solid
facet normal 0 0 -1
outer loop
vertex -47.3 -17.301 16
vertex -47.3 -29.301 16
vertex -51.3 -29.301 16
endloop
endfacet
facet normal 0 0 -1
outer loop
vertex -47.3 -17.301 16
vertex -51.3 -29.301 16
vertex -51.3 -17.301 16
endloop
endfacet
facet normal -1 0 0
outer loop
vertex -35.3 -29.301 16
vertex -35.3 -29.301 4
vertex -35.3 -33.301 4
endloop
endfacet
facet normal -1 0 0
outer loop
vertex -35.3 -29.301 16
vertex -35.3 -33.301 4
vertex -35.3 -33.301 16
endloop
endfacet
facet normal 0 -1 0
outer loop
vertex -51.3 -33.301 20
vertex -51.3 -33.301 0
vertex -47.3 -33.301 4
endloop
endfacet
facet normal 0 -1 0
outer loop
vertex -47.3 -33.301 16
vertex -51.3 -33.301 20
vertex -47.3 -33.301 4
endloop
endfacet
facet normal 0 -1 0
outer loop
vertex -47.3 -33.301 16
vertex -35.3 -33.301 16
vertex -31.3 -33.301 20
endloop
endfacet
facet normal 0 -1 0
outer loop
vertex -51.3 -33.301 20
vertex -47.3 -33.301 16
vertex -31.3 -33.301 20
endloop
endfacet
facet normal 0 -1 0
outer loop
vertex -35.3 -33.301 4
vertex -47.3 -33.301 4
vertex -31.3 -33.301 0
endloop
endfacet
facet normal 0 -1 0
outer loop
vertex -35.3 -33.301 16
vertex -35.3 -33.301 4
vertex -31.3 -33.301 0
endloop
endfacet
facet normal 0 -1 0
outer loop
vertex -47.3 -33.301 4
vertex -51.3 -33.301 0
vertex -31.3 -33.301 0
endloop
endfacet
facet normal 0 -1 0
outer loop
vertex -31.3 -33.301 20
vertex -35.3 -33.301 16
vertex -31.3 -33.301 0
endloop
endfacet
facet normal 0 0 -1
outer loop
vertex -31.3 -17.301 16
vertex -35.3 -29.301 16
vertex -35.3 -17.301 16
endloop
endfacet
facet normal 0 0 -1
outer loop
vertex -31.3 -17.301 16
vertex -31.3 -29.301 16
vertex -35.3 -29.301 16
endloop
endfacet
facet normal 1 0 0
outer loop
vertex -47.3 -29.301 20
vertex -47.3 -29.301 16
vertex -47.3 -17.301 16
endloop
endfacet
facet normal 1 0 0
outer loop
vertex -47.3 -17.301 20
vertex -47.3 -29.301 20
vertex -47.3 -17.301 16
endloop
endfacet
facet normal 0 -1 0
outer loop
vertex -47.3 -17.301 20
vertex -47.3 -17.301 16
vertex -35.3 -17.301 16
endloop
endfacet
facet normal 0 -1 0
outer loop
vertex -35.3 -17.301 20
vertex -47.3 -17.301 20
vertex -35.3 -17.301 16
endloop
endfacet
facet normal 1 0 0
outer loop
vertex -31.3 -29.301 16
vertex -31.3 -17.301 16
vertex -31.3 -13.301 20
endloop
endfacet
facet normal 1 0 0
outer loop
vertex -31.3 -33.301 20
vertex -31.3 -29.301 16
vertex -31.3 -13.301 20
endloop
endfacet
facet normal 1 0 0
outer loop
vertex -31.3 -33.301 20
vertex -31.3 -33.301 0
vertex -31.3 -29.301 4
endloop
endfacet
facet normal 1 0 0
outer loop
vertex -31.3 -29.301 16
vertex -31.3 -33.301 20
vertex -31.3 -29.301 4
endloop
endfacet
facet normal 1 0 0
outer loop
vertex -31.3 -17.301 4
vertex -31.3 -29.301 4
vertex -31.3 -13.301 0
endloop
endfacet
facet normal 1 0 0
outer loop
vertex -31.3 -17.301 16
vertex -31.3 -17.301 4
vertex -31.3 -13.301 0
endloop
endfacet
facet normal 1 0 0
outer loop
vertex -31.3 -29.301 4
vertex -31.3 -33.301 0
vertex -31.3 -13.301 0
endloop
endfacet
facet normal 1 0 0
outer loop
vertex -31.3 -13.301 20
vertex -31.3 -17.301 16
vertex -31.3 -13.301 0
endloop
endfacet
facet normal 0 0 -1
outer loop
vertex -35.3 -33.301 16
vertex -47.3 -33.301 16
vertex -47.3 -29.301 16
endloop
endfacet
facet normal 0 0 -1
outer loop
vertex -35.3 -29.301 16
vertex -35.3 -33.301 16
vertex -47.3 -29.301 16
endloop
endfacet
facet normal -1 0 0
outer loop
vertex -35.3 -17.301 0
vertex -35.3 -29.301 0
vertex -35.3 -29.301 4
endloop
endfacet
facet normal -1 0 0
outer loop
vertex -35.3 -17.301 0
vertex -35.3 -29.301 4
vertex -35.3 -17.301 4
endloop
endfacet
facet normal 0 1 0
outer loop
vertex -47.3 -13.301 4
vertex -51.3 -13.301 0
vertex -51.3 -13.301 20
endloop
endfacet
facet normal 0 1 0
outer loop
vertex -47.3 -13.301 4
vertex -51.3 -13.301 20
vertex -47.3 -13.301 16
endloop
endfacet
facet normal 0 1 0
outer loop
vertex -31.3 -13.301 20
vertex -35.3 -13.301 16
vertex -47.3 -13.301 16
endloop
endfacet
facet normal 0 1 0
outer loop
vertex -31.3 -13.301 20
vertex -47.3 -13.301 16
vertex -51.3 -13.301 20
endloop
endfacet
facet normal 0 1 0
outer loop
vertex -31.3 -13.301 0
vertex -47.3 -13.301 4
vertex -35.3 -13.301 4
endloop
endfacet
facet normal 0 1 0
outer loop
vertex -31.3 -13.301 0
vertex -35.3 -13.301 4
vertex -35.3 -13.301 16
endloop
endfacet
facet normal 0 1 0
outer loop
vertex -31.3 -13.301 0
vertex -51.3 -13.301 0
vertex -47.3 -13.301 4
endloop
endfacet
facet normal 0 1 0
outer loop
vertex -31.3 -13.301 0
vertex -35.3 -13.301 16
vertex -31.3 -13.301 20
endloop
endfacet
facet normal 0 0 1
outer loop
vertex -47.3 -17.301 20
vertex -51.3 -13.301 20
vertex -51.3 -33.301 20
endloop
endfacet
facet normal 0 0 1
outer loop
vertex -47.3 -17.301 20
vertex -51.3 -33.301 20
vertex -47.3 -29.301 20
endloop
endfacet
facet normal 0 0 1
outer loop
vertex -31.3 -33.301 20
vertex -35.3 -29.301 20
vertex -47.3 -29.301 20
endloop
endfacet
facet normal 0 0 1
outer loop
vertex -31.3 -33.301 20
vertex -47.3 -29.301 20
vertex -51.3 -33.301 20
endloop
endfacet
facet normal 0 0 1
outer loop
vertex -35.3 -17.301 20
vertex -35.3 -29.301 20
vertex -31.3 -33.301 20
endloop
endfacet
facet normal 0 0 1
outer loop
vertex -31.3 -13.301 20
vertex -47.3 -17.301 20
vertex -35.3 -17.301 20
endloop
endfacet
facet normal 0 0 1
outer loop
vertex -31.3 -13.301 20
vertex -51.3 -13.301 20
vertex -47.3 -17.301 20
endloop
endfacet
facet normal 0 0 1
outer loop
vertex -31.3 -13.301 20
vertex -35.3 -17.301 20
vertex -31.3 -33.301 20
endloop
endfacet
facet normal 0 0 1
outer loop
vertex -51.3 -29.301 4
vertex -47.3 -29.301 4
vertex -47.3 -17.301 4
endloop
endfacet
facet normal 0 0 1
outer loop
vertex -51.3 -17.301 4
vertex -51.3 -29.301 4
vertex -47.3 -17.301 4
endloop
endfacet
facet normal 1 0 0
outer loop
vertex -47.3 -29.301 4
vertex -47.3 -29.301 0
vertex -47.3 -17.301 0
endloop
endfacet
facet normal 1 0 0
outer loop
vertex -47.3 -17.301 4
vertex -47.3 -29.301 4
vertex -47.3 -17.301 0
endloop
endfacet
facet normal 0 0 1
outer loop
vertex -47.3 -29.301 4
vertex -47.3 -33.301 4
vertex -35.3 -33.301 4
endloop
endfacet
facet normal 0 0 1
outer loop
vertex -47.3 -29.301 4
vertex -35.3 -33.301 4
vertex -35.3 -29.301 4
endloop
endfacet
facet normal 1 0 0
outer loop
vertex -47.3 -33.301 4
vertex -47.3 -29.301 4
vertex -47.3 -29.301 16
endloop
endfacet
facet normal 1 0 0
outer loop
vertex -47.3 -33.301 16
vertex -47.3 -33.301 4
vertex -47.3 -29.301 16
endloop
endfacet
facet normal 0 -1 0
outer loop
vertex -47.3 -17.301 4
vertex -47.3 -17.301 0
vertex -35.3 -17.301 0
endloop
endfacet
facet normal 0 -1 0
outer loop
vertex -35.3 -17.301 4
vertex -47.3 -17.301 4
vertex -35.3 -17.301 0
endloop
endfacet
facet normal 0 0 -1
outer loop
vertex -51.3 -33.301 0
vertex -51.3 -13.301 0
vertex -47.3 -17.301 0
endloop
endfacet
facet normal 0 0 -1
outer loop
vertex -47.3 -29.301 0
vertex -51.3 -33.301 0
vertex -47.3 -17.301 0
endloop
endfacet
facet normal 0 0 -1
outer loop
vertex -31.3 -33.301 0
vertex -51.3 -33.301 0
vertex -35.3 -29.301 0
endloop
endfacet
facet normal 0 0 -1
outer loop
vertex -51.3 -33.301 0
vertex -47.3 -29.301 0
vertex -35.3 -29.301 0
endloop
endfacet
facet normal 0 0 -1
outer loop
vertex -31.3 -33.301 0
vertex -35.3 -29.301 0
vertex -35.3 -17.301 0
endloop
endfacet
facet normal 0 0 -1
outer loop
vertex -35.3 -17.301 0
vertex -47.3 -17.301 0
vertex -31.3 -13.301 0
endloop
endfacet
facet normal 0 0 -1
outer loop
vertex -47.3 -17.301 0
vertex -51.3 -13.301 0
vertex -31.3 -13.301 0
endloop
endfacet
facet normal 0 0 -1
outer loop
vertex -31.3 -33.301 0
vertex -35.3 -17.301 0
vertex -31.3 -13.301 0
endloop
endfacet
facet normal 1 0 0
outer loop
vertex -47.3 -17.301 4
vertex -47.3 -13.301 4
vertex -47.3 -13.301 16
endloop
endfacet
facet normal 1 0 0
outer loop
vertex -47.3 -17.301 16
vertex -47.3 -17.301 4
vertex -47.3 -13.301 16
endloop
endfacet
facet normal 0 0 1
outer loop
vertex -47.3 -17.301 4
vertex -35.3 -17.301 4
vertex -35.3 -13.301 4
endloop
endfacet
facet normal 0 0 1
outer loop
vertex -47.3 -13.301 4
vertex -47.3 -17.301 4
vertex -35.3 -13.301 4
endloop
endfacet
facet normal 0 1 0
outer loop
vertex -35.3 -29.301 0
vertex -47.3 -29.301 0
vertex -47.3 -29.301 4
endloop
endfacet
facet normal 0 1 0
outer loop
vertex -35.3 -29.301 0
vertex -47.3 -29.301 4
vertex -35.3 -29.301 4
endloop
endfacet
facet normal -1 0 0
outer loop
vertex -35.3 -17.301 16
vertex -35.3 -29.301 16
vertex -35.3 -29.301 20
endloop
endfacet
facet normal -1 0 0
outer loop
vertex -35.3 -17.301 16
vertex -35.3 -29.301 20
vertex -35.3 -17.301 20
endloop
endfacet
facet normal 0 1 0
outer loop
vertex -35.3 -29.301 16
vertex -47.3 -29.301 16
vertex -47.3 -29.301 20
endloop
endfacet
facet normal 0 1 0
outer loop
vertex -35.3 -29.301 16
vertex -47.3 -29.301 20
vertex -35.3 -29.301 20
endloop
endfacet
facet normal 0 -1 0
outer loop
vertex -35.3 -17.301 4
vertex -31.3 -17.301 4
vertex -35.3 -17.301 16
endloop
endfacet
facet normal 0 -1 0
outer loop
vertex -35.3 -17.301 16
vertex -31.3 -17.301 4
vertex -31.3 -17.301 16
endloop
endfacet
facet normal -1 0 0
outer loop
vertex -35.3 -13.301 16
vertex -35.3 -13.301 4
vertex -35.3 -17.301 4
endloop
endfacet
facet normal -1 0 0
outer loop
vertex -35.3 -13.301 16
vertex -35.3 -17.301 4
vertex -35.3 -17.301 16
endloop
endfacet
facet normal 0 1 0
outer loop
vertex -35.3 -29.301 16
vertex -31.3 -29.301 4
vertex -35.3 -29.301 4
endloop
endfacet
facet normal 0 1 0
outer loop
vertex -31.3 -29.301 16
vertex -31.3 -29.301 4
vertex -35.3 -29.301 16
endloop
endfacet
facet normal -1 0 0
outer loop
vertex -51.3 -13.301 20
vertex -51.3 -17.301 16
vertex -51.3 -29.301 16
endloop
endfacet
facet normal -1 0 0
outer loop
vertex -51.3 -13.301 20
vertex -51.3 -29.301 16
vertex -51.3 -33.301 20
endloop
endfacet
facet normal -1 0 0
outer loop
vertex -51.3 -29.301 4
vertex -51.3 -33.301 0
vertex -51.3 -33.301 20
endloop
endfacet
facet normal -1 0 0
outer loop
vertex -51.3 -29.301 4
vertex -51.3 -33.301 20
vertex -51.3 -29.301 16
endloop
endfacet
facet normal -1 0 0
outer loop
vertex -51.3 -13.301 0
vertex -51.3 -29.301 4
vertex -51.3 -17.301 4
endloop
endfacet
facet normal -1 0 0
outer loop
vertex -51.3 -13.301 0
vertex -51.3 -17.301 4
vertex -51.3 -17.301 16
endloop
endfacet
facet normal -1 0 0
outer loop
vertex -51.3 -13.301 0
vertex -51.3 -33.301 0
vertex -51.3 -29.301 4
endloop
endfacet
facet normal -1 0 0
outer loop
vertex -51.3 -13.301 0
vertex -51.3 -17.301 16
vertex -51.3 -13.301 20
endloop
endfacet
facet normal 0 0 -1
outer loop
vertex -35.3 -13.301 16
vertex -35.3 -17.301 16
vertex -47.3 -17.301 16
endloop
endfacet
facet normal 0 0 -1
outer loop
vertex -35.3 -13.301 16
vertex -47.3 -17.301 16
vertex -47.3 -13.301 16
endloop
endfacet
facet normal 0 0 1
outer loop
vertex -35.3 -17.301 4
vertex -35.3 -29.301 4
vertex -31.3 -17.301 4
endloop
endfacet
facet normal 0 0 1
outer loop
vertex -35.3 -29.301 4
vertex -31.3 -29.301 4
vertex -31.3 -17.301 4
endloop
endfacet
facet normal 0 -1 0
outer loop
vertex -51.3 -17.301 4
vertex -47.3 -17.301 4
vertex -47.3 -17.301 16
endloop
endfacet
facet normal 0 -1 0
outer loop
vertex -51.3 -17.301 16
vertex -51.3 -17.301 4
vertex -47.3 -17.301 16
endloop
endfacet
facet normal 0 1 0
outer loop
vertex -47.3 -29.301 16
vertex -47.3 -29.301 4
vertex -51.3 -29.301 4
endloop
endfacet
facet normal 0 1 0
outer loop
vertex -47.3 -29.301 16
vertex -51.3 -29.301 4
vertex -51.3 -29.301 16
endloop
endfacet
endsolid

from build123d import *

# Parameters (mm, degrees)
F0_W     = 20
F0_H     = 20
F1_DEPTH = 20
F2_W     = 12
F2_H     = 12
F3_DEPTH = 90
F4_W     = 12
F4_H     = 12
F5_DEPTH = 60.3
F6_W     = 12
F6_H     = 12
F7_DEPTH = 36


with BuildPart() as f1:
    # F0 (on Top) → F1 (new body)
    with BuildSketch(Plane.XY):
        with Locations((-41.299911, -23.300817)):
            Rectangle(F0_W, F0_H)
    extrude(amount=F1_DEPTH)

    # F2 (on Right) → F3 (cut)
    with BuildSketch(Plane.YZ):
        with Locations((-23.300817, 10)):
            Rectangle(F2_W, F2_H)
    extrude(amount=-F3_DEPTH, mode=Mode.SUBTRACT)

    # F4 (on Front) → F5 (cut)
    with BuildSketch(Plane.XZ):
        with Locations((-41.299911, 10)):
            Rectangle(F4_W, F4_H)
    extrude(amount=F5_DEPTH, mode=Mode.SUBTRACT)

    # F6 (on Top) → F7 (cut)
    with BuildSketch(Plane.XY):
        with Locations((-41.299911, -23.300817)):
            Rectangle(F6_W, F6_H)
    extrude(amount=F7_DEPTH, mode=Mode.SUBTRACT)


solid = f1.part
